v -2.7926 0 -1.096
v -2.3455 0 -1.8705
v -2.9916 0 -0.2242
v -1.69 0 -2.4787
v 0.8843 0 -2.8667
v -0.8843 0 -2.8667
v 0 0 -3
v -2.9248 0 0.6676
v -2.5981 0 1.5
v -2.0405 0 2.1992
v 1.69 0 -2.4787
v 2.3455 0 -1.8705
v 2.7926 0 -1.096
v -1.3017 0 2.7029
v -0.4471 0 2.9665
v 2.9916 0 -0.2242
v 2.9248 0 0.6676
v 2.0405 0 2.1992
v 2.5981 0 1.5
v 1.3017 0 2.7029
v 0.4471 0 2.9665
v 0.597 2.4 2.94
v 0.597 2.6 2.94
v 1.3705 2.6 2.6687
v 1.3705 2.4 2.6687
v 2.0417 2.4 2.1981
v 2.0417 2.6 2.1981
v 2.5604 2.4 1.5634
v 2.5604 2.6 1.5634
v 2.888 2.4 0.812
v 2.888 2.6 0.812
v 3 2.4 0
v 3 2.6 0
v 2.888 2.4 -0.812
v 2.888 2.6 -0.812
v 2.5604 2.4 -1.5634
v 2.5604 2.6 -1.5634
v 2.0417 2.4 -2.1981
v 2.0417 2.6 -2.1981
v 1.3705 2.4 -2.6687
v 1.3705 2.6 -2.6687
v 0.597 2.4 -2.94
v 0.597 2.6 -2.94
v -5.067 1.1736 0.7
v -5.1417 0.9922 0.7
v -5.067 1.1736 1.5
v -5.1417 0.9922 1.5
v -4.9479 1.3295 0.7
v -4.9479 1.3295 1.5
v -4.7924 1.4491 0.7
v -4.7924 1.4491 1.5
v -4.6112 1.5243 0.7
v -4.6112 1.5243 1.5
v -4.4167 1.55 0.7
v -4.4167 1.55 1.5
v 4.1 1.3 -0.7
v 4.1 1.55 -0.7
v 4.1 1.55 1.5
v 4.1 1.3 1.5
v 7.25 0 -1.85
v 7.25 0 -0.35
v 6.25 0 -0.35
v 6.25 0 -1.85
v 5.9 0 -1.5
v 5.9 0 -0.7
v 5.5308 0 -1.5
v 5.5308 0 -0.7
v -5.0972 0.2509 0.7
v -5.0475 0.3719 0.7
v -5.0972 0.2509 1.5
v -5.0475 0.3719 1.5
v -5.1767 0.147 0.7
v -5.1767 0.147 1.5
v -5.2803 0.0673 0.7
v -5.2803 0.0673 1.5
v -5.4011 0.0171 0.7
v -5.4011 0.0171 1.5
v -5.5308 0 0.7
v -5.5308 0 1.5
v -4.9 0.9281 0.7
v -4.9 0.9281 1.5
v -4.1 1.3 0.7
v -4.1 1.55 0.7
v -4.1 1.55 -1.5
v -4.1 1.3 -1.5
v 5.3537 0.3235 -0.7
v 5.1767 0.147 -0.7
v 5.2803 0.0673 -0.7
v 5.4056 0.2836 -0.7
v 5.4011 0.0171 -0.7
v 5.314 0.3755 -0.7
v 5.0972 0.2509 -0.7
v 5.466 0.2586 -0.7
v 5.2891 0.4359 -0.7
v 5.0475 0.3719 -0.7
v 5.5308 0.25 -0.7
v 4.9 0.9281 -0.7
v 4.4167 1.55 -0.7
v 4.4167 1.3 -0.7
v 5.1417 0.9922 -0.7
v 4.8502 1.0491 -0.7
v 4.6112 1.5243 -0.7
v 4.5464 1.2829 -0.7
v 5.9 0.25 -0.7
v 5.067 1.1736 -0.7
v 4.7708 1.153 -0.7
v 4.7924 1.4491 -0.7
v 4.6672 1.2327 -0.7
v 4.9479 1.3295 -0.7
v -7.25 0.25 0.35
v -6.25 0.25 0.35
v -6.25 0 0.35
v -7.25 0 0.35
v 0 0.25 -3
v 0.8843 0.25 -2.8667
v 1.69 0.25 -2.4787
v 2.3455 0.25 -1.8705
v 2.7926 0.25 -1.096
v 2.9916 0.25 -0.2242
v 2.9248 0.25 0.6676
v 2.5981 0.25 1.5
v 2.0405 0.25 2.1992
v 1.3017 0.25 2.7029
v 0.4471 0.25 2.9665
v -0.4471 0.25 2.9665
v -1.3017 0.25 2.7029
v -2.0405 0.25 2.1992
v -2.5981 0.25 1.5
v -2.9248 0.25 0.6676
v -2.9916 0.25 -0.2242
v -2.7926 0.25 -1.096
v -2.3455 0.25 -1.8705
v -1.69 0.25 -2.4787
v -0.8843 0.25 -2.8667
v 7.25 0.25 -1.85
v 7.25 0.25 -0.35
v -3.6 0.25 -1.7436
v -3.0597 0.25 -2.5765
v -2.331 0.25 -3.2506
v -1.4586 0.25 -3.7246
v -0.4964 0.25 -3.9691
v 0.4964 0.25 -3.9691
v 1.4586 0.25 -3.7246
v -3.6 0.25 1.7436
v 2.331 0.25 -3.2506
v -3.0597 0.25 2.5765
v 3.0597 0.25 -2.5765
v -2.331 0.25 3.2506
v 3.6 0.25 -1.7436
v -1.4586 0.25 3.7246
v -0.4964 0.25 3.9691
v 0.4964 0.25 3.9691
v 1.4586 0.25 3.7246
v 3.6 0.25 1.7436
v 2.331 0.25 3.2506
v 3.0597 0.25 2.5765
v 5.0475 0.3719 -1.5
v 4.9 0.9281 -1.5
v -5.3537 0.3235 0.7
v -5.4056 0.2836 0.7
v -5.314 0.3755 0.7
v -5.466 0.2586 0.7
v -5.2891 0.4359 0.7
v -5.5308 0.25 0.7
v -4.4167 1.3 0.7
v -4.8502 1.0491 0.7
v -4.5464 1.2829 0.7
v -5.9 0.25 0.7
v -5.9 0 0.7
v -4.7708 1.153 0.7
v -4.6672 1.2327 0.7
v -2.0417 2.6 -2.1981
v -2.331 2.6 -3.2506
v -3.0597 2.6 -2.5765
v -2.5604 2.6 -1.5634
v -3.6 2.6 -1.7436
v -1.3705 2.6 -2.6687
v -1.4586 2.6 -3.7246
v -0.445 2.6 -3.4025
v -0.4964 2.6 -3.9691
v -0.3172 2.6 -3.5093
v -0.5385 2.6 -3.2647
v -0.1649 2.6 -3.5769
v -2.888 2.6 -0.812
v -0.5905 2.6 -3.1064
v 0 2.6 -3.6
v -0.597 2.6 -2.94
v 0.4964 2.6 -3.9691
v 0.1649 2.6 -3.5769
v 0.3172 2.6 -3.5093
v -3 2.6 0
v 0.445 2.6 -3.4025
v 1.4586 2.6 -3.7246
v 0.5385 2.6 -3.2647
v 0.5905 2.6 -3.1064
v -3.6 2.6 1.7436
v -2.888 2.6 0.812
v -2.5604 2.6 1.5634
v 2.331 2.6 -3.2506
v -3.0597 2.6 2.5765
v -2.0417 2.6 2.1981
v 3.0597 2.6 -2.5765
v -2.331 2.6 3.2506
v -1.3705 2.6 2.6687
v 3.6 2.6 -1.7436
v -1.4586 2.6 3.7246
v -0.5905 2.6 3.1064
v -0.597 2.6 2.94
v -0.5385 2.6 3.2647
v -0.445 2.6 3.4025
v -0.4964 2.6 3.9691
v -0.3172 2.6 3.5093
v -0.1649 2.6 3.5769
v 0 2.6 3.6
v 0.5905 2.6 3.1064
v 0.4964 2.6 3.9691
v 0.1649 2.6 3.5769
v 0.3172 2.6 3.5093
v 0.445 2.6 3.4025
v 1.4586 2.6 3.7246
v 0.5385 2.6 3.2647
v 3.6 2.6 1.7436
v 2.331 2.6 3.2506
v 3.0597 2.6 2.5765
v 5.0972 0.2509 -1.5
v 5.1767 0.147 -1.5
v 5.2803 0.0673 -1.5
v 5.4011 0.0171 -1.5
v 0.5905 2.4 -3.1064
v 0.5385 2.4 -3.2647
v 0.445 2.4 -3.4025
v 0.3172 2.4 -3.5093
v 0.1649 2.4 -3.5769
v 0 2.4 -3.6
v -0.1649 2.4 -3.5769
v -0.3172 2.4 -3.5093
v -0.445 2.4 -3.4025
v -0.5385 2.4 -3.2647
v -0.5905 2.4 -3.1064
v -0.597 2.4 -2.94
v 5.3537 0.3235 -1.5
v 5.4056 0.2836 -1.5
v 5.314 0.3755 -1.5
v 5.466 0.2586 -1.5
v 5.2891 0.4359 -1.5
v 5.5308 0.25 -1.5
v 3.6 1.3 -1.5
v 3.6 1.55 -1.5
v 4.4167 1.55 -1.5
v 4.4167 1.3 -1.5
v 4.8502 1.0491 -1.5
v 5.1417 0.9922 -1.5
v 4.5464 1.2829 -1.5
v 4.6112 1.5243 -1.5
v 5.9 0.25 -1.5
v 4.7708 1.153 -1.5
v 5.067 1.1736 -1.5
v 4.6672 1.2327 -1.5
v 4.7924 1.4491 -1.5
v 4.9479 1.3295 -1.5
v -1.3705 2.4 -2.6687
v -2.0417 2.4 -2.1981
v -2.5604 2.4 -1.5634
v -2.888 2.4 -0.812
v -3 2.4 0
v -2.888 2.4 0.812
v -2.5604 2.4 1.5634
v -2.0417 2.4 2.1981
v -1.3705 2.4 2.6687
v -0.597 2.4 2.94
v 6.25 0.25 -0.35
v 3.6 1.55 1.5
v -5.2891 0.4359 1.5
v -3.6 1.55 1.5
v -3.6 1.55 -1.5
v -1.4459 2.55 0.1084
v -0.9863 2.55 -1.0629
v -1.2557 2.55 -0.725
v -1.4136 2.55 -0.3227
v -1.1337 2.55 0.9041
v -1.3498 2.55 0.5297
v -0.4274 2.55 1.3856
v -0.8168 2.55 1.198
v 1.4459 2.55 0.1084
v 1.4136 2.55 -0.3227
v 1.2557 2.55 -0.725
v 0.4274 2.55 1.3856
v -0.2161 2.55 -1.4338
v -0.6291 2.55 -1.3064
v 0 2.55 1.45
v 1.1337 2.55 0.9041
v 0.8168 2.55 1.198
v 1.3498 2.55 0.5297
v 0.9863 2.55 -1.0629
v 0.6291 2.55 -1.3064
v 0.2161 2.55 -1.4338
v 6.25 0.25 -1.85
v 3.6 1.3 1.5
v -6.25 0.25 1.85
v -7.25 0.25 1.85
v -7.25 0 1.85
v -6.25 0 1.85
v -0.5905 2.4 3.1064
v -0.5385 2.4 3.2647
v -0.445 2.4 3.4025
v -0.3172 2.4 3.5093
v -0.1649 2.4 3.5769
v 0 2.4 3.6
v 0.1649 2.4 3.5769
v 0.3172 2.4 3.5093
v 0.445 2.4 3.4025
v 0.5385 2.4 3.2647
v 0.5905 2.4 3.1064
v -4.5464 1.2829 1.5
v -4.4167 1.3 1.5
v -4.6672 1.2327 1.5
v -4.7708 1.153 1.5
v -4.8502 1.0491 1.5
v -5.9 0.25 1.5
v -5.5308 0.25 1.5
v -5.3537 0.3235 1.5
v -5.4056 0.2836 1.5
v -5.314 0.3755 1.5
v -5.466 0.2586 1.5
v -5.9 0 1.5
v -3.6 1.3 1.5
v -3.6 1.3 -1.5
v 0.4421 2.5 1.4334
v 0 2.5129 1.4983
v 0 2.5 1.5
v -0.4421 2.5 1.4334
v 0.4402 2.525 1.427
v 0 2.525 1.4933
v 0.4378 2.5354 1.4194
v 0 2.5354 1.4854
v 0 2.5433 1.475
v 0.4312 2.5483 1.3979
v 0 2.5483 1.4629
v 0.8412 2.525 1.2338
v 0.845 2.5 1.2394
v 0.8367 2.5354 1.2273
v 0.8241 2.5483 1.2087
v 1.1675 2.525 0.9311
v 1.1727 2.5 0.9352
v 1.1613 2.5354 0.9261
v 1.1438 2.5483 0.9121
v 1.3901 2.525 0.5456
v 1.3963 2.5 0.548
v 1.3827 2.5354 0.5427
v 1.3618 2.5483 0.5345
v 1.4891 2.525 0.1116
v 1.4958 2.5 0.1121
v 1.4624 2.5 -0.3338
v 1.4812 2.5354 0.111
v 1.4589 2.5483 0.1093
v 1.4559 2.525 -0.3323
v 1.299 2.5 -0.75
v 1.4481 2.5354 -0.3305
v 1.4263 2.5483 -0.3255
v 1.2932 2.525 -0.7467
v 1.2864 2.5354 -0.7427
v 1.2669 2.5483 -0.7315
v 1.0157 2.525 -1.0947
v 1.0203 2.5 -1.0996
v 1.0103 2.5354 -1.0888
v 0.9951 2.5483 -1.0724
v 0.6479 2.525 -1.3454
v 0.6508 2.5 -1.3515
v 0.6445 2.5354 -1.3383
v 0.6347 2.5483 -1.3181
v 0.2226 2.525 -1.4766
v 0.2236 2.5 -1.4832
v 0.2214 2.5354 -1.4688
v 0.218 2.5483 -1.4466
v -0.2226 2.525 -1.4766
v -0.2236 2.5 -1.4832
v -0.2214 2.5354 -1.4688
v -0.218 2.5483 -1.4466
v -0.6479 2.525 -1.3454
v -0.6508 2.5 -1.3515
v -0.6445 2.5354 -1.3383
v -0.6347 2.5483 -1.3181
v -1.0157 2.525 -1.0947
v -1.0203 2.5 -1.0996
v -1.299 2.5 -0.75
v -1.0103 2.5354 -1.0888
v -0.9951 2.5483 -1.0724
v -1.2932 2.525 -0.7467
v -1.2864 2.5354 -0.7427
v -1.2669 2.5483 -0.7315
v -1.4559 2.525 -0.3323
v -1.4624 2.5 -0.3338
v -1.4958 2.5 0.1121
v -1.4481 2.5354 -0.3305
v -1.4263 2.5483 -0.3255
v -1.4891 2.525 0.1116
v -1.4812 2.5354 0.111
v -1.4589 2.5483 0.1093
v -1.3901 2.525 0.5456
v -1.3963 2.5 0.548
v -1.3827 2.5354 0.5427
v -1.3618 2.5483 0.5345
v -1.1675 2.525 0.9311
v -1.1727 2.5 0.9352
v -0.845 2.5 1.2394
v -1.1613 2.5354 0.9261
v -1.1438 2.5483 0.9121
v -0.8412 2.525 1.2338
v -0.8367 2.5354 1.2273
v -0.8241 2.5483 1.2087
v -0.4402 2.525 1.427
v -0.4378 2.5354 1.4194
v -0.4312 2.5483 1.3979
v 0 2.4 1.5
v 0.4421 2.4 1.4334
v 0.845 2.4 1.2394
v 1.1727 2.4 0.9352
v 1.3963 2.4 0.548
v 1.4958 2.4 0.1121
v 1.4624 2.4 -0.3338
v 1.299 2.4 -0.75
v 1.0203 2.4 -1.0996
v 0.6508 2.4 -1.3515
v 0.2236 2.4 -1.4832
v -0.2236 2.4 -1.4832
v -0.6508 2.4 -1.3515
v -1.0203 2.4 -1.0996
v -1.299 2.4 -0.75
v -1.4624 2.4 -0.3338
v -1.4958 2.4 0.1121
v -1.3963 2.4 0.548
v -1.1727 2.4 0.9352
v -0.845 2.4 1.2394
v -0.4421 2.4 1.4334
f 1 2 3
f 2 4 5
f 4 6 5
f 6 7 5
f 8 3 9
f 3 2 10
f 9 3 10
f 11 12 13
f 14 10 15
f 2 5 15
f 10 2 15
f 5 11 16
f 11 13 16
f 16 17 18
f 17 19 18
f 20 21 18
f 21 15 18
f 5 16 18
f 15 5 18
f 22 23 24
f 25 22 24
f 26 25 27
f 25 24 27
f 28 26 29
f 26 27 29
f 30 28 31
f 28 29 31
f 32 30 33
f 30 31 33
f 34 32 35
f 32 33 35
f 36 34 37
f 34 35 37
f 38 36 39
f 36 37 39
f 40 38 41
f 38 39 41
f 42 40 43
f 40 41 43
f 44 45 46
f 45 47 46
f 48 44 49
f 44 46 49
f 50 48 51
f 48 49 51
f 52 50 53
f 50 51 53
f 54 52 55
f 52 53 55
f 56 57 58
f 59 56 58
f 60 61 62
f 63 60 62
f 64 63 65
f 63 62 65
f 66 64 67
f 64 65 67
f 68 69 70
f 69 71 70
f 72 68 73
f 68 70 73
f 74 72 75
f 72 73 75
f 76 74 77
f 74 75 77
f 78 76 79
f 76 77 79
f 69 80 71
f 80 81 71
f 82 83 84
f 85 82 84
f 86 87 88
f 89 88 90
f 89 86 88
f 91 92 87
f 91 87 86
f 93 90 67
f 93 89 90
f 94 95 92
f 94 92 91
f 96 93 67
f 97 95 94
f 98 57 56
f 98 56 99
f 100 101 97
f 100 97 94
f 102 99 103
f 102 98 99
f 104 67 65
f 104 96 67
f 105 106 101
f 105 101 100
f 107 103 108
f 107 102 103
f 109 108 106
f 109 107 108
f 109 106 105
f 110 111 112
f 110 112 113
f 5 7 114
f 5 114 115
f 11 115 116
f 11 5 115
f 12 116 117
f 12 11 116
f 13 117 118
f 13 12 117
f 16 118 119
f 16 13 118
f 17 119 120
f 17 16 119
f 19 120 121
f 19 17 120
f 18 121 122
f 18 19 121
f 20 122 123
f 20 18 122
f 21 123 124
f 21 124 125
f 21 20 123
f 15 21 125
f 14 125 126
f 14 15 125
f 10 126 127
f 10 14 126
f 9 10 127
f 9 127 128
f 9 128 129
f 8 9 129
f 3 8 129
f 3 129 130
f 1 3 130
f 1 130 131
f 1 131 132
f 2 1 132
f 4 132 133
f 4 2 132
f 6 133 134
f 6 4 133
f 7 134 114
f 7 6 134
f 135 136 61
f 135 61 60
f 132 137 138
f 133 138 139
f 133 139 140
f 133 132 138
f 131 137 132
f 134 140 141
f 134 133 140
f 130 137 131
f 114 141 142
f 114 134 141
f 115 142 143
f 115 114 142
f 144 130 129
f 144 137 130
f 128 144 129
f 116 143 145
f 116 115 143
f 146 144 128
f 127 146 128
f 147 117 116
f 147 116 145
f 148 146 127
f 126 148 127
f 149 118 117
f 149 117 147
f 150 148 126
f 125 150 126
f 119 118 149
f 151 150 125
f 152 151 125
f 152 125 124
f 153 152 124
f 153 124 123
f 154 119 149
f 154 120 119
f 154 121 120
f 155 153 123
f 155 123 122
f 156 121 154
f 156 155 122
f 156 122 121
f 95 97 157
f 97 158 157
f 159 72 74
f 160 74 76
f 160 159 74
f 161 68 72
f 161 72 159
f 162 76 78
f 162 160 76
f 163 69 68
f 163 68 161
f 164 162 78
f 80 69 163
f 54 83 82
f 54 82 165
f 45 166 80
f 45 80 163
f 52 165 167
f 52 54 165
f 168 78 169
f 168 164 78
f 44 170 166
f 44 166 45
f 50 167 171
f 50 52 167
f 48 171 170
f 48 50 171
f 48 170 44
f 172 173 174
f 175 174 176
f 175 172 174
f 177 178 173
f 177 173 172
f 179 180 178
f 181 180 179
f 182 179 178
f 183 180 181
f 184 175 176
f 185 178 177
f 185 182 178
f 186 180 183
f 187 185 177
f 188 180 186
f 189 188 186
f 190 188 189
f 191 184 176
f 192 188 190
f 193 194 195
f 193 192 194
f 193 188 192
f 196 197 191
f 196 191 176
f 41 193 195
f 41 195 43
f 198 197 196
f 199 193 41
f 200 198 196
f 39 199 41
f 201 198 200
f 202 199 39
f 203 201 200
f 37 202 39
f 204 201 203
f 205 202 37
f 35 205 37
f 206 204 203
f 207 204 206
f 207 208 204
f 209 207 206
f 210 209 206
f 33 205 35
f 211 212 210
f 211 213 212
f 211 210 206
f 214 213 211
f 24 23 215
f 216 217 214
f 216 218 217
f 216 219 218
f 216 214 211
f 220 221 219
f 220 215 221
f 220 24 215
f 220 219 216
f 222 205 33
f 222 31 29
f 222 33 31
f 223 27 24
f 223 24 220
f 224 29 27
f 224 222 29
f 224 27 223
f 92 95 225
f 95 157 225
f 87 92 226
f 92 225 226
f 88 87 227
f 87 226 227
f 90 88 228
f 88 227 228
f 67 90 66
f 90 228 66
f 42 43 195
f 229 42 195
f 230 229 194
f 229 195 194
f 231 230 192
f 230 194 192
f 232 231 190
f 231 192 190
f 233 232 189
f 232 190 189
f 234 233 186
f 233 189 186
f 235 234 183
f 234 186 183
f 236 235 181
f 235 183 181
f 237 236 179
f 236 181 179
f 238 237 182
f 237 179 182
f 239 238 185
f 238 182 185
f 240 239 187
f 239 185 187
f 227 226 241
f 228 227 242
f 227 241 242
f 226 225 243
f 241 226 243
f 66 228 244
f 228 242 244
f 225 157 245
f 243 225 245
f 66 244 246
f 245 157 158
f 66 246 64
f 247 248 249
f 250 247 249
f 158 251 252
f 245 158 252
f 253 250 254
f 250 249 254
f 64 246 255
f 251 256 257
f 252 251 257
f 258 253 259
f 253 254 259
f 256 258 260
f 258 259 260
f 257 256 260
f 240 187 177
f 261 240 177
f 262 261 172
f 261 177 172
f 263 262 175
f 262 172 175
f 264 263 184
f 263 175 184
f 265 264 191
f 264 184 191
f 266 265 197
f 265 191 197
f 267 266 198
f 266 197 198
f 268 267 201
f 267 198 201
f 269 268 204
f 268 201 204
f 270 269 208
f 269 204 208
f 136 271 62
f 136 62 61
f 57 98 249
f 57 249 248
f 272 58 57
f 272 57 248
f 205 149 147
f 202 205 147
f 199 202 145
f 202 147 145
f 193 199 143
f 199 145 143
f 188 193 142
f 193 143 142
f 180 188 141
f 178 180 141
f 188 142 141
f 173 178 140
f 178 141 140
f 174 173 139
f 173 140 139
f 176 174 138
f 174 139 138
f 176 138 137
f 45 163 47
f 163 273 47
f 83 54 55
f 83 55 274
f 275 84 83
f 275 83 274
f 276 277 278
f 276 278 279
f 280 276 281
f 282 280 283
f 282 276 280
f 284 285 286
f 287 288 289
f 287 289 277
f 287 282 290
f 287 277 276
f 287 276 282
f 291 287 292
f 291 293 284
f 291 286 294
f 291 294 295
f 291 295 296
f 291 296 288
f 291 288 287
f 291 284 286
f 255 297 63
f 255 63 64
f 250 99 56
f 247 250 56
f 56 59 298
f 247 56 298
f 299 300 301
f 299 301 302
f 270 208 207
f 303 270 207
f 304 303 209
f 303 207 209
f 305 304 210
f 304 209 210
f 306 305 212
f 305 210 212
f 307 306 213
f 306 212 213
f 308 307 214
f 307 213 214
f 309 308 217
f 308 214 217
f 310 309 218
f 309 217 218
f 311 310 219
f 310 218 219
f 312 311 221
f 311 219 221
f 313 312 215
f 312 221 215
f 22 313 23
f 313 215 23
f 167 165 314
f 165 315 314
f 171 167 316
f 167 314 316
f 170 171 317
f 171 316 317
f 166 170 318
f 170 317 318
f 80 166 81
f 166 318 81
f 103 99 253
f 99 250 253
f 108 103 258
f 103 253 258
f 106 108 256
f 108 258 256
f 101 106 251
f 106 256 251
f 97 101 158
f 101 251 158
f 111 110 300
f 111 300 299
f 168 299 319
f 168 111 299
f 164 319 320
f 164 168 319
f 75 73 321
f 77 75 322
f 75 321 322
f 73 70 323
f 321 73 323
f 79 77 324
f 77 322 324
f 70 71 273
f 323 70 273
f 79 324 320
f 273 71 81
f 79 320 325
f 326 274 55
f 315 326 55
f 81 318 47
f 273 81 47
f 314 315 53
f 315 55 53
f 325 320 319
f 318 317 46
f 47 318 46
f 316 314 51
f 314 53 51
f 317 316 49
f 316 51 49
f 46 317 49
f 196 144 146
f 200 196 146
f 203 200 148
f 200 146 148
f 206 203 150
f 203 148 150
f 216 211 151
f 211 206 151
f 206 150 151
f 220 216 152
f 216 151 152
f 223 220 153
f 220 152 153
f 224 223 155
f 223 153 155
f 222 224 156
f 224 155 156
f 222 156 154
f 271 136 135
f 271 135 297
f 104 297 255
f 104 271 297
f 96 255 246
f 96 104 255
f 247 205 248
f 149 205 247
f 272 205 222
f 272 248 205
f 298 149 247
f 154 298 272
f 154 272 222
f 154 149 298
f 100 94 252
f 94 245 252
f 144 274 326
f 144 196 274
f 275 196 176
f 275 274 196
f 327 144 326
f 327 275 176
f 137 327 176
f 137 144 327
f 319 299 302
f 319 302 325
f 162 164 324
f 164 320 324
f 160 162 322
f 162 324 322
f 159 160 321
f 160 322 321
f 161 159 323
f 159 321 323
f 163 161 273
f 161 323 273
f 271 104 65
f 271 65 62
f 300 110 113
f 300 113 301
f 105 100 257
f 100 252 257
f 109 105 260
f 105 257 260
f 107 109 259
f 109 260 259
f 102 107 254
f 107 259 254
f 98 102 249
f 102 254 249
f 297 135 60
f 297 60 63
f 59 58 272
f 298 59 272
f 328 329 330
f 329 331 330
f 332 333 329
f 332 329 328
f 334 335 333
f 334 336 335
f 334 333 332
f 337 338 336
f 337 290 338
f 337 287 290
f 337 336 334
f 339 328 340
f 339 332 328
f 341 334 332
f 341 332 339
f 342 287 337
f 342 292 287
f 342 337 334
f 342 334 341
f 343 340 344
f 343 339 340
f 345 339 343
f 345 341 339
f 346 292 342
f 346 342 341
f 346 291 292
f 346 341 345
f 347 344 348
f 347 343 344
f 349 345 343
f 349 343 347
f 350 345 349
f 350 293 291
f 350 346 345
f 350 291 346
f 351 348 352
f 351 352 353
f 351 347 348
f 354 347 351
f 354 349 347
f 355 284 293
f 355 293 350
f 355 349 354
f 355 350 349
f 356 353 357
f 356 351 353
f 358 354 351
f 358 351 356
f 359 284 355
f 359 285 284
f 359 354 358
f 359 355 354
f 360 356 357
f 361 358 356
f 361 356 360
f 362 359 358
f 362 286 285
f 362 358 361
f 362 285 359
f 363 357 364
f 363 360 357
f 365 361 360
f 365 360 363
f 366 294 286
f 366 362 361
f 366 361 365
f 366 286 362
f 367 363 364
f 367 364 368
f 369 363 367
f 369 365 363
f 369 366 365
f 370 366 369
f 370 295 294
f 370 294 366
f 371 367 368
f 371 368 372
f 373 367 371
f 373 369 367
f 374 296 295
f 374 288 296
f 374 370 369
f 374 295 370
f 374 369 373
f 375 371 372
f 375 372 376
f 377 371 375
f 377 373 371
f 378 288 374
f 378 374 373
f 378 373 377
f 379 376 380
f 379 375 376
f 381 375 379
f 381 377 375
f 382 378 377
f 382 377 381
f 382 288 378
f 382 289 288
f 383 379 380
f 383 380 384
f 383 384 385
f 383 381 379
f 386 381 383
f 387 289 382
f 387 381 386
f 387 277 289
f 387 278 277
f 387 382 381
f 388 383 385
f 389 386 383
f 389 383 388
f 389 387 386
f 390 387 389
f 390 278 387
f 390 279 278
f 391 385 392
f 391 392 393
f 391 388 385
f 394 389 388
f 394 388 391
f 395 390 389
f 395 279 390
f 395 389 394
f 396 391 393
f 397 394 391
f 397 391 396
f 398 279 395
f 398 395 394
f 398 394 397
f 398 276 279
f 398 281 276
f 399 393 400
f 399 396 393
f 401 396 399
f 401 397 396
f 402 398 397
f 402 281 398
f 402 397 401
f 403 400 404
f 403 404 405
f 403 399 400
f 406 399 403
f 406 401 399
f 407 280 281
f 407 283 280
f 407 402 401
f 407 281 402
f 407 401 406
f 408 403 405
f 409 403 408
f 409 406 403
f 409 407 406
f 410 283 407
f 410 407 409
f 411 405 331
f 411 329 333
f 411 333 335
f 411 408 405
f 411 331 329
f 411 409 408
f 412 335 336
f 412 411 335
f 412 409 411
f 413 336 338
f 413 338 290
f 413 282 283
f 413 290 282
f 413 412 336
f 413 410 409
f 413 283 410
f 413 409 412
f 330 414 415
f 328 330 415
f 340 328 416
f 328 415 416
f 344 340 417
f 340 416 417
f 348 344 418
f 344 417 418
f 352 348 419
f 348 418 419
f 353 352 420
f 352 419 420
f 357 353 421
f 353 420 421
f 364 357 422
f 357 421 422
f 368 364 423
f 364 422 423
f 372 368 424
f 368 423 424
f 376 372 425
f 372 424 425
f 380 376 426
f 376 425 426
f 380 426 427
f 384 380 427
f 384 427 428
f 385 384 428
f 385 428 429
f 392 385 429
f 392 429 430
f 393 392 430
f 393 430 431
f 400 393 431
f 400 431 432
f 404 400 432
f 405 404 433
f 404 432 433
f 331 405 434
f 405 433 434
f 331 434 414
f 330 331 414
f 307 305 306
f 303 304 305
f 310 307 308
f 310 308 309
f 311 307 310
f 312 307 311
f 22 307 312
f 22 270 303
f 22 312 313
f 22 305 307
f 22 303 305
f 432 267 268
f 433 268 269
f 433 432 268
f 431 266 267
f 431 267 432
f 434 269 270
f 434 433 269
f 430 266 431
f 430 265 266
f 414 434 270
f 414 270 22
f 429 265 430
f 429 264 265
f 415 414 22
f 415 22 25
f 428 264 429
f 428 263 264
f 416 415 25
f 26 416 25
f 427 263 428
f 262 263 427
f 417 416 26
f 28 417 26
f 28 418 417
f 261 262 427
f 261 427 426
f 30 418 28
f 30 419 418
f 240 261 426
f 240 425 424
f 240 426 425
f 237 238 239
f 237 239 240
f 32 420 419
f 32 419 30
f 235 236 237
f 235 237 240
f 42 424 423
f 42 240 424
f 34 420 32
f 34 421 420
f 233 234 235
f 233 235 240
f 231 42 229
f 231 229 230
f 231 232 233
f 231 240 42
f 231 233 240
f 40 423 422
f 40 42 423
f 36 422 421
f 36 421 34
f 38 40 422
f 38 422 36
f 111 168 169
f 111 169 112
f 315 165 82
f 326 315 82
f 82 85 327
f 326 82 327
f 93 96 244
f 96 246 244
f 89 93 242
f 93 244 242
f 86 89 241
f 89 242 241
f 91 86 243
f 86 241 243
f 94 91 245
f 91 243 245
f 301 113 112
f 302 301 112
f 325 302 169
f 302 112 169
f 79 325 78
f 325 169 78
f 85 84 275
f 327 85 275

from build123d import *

# Parameters (mm, degrees)
SKETCH1_R           = 4
EXTRUDE1_DEPTH      = 2.6
EXTRUDE2_START      = -4
EXTRUDE2_DEPTH      = 5
CUT_EXTRUDE1_DEPTH  = 0.2
SKETCH12_R          = 1.5
BOSS_EXTRUDE3_DEPTH = 0.15
FILLET4_R           = 0.05
EXTRUDE_THIN1_START = 1.1
EXTRUDE_THIN1_DEPTH = 0.4
EXTRUDE3_DEPTH      = 0.25
SKETCH10_R          = 3
EXTRUDE6_DEPTH      = 0.25
SKETCH13_W          = 0.5
SKETCH13_H          = 2.199959577
BOSS_EXTRUDE4_DEPTH = 0.25
CIRPATTERN1_COUNT   = 2


with BuildPart() as part:
    # Sketch1 → Extrude1 (new body)
    with BuildSketch(Plane(origin=(0, 0, 0), x_dir=(1, 0, 0), z_dir=(0, 1, 0))):
        with Locations(Location((0, 0, 0), (0, 0, 270))):
            Circle(SKETCH1_R)
    extrude(amount=EXTRUDE1_DEPTH)

    # Extrude2: read off the stored shape, not the designer's step
    # Extrude2 outline → Extrude2 (cut)
    with BuildSketch(Plane(origin=(0, 2.6, 0), x_dir=(1, 0, 0), z_dir=(0, 1, 0)).offset(EXTRUDE2_START)):
        with BuildLine():
            Line((-3.6, -1.743559577), (-3.6, 1.743559577))
            ThreePointArc((-3.6, 1.743559577), (-4, 0), (-3.6, -1.743559577))
        make_face()
        with BuildLine():
            ThreePointArc((3.6, -1.743559577), (4, 0), (3.6, 1.743559577))
            Line((3.6, 1.743559577), (3.6, -1.743559577))
        make_face()
    extrude(amount=EXTRUDE2_DEPTH, mode=Mode.SUBTRACT)

    # Sketch2<3> → Cut-Extrude1 (cut)
    with BuildSketch(Plane(origin=(0, 2.6, 0), x_dir=(1, 0, 0), z_dir=(0, 1, 0))):
        with BuildLine():
            ThreePointArc((-0.596992462, -2.94), (0, -3.6), (0.596992462, -2.94))
            ThreePointArc((0.596992462, -2.94), (3, 0), (0.596992462, 2.94))
            ThreePointArc((0.596992462, 2.94), (0, 3.6), (-0.596992462, 2.94))
            ThreePointArc((-0.596992462, 2.94), (-3, 0), (-0.596992462, -2.94))
        make_face()
    extrude(amount=-CUT_EXTRUDE1_DEPTH, mode=Mode.SUBTRACT)

    # Sketch12 → Boss-Extrude3 (add)
    with BuildSketch(Plane(origin=(0, 2.4, 0), x_dir=(1, 0, 0), z_dir=(0, 1, 0))):
        with Locations(Location((0, 0, 0), (0, 0, 270))):
            Circle(SKETCH12_R)
    extrude(amount=BOSS_EXTRUDE3_DEPTH)

    # Fillet4
    fillet4_edges = [part.edges().sort_by_distance(p)[0] for p in [
        (0, 2.55, -1.5),
    ]]
    fillet(fillet4_edges, radius=FILLET4_R)

    # Sketch6 → Extrude-Thin1 (add, symmetric)
    with BuildSketch(Plane.XY.offset(EXTRUDE_THIN1_START)):
        with BuildLine():
            Line((-3.6, 1.3), (-4.416697321, 1.3))
            ThreePointArc((-4.416697321, 1.3), (-4.721601087, 1.19627477), (-4.9, 0.928134773))
            Line((-4.9, 0.928134773), (-5.047479985, 0.371865227))
            ThreePointArc((-5.047479985, 0.371865227), (-5.225878898, 0.10372523), (-5.530782665, 0))
            Line((-5.530782665, 0), (-7.25, 0))
            Line((-7.25, 0), (-7.25, 0.25))
            Line((-7.25, 0.25), (-5.530782665, 0.25))
            ThreePointArc((-5.530782665, 0.25), (-5.378330782, 0.301862615), (-5.289131325, 0.435932613))
            Line((-5.289131325, 0.435932613), (-5.14165134, 0.99220216))
            ThreePointArc((-5.14165134, 0.99220216), (-4.87405297, 1.394412155), (-4.416697321, 1.55))
            Line((-4.416697321, 1.55), (-3.6, 1.55))
            Line((-3.6, 1.55), (-3.6, 1.3))
        make_face()
    extrude_thin1 = extrude(amount=EXTRUDE_THIN1_DEPTH, both=True)

    # Sketch7 → Extrude3 (add)
    with BuildSketch(Plane(origin=(0, 0.25, 0), x_dir=(1, 0, 0), z_dir=(0, 1, 0))):
        Polygon((-5.9, -0.7), (-6.25, -0.35), (-7.25, -0.35), (-7.25, -1.85), (-6.25, -1.85), (-5.9, -1.5), align=None)
    extrude3 = extrude(amount=-EXTRUDE3_DEPTH)

    # Sketch10 → Extrude6 (cut)
    with BuildSketch(Plane.XZ):
        with BuildLine():
            Line((3.6, -1.743559577), (3.6, 1.743559577))
            ThreePointArc((3.6, 1.743559577), (0, 4), (-3.6, 1.743559577))
            Line((-3.6, 1.743559577), (-3.6, -1.743559577))
            ThreePointArc((-3.6, -1.743559577), (0, -4), (3.6, -1.743559577))
        make_face()
        with Locations(Location((0, 0, 0), (0, 0, 270))):
            Circle(SKETCH10_R, mode=Mode.SUBTRACT)
    extrude(amount=-EXTRUDE6_DEPTH, mode=Mode.SUBTRACT)

    # Sketch13 → Boss-Extrude4 (add)
    with BuildSketch(Plane(origin=(0, 1.55, 0), x_dir=(1, 0, 0), z_dir=(0, 1, 0))):
        with Locations((-3.85, 0.399979788)):
            Rectangle(SKETCH13_W, SKETCH13_H)
    boss_extrude4 = extrude(amount=-BOSS_EXTRUDE4_DEPTH)

    # CirPattern1: Extrude-Thin1, Extrude3, Boss-Extrude4 ×2 about axis
    cirpattern1_axis = Axis((0, 0, 0), (0, 1, 0))
    add([extrude_thin1.rotate(cirpattern1_axis, i * 360 / CIRPATTERN1_COUNT) for i in range(1, CIRPATTERN1_COUNT)])
    add([extrude3.rotate(cirpattern1_axis, i * 360 / CIRPATTERN1_COUNT) for i in range(1, CIRPATTERN1_COUNT)])
    add([boss_extrude4.rotate(cirpattern1_axis, i * 360 / CIRPATTERN1_COUNT) for i in range(1, CIRPATTERN1_COUNT)])


solid = part.part
